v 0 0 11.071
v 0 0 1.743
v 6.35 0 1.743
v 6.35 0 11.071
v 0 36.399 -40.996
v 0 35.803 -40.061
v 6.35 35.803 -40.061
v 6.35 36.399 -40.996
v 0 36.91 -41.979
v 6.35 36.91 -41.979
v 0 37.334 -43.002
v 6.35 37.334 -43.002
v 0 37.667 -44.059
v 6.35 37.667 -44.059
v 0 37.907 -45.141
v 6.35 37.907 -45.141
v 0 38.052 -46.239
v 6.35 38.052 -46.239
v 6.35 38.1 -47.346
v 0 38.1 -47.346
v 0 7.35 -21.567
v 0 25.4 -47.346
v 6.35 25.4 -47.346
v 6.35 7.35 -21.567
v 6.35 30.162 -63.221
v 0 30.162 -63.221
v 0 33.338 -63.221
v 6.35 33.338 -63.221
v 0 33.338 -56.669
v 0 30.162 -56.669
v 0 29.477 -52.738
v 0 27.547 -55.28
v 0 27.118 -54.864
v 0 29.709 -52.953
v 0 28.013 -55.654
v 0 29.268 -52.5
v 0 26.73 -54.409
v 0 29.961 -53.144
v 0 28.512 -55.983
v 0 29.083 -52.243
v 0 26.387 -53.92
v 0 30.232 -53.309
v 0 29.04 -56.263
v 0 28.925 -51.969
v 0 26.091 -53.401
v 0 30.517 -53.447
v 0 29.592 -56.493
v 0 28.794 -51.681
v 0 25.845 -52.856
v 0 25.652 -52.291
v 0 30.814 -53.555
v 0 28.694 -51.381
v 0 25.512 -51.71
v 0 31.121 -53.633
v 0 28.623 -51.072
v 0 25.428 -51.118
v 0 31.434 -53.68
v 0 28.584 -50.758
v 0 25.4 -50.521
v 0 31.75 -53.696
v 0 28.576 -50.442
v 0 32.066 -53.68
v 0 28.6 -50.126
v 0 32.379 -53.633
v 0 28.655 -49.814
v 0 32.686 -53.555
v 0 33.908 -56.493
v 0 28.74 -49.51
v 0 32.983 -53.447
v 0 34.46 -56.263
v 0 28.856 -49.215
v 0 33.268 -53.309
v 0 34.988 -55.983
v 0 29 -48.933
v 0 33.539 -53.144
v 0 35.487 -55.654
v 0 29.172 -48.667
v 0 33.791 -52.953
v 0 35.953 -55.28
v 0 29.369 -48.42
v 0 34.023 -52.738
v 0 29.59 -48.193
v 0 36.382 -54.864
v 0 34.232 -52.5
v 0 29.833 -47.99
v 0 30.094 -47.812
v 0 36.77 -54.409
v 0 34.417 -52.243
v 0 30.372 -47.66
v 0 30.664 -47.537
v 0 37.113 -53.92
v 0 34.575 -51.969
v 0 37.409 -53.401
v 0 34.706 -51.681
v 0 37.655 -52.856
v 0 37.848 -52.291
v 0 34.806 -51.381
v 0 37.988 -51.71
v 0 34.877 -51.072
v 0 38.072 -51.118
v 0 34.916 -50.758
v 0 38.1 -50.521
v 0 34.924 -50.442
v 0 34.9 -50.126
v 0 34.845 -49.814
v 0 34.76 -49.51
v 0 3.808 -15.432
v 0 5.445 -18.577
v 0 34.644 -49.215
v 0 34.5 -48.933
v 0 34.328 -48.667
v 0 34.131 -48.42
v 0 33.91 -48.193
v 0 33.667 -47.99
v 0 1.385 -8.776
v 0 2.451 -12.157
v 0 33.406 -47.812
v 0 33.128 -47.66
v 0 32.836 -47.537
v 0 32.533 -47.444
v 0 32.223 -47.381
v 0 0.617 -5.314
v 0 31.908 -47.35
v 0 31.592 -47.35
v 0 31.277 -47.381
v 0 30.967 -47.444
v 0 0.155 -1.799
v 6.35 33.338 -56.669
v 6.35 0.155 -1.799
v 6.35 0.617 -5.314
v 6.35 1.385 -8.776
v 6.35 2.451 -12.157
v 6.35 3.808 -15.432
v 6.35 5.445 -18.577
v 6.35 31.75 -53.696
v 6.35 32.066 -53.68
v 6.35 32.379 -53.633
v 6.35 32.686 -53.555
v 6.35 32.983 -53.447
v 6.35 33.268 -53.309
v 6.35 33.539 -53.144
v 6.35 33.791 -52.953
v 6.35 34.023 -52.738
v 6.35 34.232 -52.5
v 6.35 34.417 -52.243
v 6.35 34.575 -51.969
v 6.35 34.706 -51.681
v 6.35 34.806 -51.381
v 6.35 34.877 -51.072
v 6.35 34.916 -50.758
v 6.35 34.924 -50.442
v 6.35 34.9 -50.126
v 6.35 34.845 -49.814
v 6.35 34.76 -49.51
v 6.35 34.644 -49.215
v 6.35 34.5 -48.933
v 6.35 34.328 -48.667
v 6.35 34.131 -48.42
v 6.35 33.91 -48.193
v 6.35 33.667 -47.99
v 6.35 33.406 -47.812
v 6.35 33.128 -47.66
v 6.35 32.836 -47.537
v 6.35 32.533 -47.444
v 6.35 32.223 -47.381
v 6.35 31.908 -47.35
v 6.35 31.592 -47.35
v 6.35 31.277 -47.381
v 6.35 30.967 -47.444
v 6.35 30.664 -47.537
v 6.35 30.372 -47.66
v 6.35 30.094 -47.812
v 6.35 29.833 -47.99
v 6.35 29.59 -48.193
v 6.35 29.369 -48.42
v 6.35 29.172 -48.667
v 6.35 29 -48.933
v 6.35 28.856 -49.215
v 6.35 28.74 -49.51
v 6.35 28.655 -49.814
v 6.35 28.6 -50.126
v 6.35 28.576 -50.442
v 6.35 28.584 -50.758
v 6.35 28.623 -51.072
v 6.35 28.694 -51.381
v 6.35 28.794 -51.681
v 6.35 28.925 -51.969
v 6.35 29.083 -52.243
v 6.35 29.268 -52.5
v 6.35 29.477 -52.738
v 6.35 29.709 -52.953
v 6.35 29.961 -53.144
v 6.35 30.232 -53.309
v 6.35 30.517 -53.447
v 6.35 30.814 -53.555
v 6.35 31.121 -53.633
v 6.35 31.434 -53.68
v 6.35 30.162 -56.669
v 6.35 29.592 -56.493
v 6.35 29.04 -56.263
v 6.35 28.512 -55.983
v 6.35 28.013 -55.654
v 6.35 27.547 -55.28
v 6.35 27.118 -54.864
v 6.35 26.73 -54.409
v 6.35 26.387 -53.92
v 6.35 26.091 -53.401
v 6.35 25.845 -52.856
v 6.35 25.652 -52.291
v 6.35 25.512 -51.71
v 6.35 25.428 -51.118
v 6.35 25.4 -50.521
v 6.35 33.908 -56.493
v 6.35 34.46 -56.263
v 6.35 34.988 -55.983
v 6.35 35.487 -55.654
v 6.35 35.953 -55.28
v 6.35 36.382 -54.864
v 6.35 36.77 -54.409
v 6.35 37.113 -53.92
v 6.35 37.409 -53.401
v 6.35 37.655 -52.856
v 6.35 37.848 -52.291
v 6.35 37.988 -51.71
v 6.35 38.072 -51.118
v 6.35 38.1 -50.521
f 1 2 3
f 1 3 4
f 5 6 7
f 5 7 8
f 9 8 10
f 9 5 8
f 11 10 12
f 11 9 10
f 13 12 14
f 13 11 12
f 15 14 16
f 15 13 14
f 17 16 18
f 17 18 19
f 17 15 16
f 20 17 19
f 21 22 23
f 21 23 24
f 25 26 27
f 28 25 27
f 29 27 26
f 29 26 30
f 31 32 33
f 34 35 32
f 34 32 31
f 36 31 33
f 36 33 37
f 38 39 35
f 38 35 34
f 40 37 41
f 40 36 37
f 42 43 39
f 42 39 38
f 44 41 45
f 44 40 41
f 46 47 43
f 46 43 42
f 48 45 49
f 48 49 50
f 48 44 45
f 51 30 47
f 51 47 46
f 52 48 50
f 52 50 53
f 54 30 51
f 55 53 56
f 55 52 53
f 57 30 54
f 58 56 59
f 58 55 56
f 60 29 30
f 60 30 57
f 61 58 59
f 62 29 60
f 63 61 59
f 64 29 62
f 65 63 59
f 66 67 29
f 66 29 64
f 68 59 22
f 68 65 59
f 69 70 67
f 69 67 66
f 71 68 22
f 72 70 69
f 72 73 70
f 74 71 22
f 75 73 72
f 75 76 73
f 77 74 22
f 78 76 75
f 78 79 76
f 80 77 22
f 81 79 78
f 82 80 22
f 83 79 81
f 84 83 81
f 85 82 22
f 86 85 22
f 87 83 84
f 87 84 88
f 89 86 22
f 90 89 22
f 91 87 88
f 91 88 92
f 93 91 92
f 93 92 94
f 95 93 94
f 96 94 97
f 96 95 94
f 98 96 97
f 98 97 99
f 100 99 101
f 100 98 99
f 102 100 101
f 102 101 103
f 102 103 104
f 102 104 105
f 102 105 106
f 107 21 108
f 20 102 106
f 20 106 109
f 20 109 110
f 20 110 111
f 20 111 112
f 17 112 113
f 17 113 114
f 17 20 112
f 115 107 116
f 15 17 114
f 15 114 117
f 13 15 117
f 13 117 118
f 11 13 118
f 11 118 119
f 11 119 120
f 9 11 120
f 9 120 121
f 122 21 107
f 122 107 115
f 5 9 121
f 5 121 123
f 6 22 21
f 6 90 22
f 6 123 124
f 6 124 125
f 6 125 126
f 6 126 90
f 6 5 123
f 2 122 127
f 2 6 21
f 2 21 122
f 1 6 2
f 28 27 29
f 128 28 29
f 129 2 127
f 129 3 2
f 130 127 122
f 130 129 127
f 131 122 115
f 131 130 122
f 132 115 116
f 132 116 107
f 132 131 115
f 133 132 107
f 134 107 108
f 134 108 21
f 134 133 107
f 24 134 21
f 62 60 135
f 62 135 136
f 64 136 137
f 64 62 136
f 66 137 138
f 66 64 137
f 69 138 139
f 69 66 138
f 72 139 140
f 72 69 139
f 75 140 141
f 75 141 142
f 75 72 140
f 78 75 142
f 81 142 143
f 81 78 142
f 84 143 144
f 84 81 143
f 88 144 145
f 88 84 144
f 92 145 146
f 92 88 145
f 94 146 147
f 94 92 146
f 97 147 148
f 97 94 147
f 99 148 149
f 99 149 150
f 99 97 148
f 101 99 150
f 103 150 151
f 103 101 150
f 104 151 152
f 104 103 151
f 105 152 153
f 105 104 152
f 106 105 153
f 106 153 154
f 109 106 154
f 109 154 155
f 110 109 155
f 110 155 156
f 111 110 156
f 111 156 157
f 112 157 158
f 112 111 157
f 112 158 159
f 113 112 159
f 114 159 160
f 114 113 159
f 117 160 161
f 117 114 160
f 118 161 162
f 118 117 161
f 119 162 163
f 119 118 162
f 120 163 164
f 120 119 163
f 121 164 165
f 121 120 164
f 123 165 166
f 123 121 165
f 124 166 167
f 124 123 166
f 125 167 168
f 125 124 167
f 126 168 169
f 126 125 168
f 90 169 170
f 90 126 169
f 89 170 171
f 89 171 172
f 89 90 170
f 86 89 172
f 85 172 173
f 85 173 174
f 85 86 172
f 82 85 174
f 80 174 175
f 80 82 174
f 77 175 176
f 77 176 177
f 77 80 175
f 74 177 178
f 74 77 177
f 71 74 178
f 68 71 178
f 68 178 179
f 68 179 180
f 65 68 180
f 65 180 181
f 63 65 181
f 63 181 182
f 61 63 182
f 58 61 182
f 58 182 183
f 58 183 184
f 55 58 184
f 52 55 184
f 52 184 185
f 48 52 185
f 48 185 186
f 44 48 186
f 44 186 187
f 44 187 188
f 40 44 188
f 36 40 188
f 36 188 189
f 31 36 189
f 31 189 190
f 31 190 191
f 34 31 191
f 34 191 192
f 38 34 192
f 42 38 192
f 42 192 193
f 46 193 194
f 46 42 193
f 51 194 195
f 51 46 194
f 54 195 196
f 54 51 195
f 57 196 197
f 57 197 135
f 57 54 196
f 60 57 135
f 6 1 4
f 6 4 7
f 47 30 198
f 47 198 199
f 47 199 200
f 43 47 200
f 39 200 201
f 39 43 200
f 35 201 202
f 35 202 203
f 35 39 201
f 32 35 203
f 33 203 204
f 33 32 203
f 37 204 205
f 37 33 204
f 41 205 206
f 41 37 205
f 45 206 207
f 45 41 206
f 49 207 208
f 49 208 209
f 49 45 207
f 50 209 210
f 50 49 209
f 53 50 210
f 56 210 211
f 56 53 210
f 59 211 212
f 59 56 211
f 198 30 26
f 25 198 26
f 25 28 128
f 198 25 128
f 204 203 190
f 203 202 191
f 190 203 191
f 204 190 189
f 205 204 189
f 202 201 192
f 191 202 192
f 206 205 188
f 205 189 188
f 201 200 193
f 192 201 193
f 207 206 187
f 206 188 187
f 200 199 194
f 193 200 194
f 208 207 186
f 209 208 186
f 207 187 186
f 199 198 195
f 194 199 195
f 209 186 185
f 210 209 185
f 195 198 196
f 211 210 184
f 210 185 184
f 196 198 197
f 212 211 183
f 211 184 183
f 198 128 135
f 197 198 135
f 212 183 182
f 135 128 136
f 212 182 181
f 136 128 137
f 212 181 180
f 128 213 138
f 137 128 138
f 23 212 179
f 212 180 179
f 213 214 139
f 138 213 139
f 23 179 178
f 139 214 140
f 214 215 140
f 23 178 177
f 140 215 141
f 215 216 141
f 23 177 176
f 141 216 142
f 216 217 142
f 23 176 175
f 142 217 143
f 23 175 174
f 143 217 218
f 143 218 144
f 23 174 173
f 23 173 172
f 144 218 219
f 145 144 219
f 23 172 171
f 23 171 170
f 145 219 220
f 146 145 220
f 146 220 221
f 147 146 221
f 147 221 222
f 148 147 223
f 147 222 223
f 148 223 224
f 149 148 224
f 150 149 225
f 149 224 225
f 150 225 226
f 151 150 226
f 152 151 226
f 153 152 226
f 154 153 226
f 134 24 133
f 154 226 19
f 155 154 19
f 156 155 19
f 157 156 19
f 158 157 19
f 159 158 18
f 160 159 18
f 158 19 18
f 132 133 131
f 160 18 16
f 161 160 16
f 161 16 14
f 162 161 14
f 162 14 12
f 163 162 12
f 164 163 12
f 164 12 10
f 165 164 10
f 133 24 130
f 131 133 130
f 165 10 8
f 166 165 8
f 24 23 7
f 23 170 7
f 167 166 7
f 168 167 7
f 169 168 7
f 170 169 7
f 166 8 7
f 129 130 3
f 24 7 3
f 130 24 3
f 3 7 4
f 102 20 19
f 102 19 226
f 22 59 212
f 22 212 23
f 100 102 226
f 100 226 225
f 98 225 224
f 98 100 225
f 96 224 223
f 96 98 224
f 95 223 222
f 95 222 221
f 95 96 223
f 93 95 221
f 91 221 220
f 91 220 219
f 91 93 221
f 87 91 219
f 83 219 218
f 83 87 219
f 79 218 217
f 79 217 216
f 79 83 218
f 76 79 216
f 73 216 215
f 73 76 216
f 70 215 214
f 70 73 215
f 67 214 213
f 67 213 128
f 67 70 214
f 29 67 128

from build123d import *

# Parameters (mm, degrees)
SKETCH2_R           = 3.175
BOSS_EXTRUDE1_DEPTH = 6.35
FILLET1_R           = 40.64


with BuildPart() as part:
    # Sketch2 → Boss-Extrude1 (new body)
    # profile 1 of 2: a face of its own
    with BuildSketch(Plane(origin=(0, 0, 0), x_dir=(0, 0, -1), z_dir=(1, 0, 0))):
        with BuildLine():
            ThreePointArc((40.061425782, 35.803230962), (43.52688287, 37.512205275), (47.345846523, 38.1))
            Line((47.345846523, 38.1), (50.520846523, 38.1))
            ThreePointArc((50.520846523, 38.1), (56.870846523, 31.75), (50.520846523, 25.4))
            Line((50.520846523, 25.4), (47.345846523, 25.4))
            Line((47.345846523, 25.4), (11.070887152, 0))
            Line((11.070887152, 0), (-11.070887152, 0))
            Line((-11.070887152, 0), (40.061425782, 35.803230962))
        make_face()
        with Locations((50.520846523, 31.75)):
            Circle(SKETCH2_R, mode=Mode.SUBTRACT)
    # profile 2 of 2: a face of its own
    with BuildSketch(Plane(origin=(0, 0, 0), x_dir=(0, 0, -1), z_dir=(1, 0, 0))):
        with BuildLine():
            ThreePointArc((56.669207586, 33.3375), (56.870846523, 31.75), (56.669207586, 30.1625))
            Line((56.669207586, 30.1625), (63.220846523, 30.1625))
            Line((63.220846523, 30.1625), (63.220846523, 33.3375))
            Line((63.220846523, 33.3375), (56.669207586, 33.3375))
        make_face()
    extrude(amount=BOSS_EXTRUDE1_DEPTH)

    # Fillet1
    fillet1_edges = [part.edges().sort_by_distance(p)[0] for p in [
        (3.175, 0, -11.070887152),
    ]]
    fillet(fillet1_edges, radius=FILLET1_R)


solid = part.part
